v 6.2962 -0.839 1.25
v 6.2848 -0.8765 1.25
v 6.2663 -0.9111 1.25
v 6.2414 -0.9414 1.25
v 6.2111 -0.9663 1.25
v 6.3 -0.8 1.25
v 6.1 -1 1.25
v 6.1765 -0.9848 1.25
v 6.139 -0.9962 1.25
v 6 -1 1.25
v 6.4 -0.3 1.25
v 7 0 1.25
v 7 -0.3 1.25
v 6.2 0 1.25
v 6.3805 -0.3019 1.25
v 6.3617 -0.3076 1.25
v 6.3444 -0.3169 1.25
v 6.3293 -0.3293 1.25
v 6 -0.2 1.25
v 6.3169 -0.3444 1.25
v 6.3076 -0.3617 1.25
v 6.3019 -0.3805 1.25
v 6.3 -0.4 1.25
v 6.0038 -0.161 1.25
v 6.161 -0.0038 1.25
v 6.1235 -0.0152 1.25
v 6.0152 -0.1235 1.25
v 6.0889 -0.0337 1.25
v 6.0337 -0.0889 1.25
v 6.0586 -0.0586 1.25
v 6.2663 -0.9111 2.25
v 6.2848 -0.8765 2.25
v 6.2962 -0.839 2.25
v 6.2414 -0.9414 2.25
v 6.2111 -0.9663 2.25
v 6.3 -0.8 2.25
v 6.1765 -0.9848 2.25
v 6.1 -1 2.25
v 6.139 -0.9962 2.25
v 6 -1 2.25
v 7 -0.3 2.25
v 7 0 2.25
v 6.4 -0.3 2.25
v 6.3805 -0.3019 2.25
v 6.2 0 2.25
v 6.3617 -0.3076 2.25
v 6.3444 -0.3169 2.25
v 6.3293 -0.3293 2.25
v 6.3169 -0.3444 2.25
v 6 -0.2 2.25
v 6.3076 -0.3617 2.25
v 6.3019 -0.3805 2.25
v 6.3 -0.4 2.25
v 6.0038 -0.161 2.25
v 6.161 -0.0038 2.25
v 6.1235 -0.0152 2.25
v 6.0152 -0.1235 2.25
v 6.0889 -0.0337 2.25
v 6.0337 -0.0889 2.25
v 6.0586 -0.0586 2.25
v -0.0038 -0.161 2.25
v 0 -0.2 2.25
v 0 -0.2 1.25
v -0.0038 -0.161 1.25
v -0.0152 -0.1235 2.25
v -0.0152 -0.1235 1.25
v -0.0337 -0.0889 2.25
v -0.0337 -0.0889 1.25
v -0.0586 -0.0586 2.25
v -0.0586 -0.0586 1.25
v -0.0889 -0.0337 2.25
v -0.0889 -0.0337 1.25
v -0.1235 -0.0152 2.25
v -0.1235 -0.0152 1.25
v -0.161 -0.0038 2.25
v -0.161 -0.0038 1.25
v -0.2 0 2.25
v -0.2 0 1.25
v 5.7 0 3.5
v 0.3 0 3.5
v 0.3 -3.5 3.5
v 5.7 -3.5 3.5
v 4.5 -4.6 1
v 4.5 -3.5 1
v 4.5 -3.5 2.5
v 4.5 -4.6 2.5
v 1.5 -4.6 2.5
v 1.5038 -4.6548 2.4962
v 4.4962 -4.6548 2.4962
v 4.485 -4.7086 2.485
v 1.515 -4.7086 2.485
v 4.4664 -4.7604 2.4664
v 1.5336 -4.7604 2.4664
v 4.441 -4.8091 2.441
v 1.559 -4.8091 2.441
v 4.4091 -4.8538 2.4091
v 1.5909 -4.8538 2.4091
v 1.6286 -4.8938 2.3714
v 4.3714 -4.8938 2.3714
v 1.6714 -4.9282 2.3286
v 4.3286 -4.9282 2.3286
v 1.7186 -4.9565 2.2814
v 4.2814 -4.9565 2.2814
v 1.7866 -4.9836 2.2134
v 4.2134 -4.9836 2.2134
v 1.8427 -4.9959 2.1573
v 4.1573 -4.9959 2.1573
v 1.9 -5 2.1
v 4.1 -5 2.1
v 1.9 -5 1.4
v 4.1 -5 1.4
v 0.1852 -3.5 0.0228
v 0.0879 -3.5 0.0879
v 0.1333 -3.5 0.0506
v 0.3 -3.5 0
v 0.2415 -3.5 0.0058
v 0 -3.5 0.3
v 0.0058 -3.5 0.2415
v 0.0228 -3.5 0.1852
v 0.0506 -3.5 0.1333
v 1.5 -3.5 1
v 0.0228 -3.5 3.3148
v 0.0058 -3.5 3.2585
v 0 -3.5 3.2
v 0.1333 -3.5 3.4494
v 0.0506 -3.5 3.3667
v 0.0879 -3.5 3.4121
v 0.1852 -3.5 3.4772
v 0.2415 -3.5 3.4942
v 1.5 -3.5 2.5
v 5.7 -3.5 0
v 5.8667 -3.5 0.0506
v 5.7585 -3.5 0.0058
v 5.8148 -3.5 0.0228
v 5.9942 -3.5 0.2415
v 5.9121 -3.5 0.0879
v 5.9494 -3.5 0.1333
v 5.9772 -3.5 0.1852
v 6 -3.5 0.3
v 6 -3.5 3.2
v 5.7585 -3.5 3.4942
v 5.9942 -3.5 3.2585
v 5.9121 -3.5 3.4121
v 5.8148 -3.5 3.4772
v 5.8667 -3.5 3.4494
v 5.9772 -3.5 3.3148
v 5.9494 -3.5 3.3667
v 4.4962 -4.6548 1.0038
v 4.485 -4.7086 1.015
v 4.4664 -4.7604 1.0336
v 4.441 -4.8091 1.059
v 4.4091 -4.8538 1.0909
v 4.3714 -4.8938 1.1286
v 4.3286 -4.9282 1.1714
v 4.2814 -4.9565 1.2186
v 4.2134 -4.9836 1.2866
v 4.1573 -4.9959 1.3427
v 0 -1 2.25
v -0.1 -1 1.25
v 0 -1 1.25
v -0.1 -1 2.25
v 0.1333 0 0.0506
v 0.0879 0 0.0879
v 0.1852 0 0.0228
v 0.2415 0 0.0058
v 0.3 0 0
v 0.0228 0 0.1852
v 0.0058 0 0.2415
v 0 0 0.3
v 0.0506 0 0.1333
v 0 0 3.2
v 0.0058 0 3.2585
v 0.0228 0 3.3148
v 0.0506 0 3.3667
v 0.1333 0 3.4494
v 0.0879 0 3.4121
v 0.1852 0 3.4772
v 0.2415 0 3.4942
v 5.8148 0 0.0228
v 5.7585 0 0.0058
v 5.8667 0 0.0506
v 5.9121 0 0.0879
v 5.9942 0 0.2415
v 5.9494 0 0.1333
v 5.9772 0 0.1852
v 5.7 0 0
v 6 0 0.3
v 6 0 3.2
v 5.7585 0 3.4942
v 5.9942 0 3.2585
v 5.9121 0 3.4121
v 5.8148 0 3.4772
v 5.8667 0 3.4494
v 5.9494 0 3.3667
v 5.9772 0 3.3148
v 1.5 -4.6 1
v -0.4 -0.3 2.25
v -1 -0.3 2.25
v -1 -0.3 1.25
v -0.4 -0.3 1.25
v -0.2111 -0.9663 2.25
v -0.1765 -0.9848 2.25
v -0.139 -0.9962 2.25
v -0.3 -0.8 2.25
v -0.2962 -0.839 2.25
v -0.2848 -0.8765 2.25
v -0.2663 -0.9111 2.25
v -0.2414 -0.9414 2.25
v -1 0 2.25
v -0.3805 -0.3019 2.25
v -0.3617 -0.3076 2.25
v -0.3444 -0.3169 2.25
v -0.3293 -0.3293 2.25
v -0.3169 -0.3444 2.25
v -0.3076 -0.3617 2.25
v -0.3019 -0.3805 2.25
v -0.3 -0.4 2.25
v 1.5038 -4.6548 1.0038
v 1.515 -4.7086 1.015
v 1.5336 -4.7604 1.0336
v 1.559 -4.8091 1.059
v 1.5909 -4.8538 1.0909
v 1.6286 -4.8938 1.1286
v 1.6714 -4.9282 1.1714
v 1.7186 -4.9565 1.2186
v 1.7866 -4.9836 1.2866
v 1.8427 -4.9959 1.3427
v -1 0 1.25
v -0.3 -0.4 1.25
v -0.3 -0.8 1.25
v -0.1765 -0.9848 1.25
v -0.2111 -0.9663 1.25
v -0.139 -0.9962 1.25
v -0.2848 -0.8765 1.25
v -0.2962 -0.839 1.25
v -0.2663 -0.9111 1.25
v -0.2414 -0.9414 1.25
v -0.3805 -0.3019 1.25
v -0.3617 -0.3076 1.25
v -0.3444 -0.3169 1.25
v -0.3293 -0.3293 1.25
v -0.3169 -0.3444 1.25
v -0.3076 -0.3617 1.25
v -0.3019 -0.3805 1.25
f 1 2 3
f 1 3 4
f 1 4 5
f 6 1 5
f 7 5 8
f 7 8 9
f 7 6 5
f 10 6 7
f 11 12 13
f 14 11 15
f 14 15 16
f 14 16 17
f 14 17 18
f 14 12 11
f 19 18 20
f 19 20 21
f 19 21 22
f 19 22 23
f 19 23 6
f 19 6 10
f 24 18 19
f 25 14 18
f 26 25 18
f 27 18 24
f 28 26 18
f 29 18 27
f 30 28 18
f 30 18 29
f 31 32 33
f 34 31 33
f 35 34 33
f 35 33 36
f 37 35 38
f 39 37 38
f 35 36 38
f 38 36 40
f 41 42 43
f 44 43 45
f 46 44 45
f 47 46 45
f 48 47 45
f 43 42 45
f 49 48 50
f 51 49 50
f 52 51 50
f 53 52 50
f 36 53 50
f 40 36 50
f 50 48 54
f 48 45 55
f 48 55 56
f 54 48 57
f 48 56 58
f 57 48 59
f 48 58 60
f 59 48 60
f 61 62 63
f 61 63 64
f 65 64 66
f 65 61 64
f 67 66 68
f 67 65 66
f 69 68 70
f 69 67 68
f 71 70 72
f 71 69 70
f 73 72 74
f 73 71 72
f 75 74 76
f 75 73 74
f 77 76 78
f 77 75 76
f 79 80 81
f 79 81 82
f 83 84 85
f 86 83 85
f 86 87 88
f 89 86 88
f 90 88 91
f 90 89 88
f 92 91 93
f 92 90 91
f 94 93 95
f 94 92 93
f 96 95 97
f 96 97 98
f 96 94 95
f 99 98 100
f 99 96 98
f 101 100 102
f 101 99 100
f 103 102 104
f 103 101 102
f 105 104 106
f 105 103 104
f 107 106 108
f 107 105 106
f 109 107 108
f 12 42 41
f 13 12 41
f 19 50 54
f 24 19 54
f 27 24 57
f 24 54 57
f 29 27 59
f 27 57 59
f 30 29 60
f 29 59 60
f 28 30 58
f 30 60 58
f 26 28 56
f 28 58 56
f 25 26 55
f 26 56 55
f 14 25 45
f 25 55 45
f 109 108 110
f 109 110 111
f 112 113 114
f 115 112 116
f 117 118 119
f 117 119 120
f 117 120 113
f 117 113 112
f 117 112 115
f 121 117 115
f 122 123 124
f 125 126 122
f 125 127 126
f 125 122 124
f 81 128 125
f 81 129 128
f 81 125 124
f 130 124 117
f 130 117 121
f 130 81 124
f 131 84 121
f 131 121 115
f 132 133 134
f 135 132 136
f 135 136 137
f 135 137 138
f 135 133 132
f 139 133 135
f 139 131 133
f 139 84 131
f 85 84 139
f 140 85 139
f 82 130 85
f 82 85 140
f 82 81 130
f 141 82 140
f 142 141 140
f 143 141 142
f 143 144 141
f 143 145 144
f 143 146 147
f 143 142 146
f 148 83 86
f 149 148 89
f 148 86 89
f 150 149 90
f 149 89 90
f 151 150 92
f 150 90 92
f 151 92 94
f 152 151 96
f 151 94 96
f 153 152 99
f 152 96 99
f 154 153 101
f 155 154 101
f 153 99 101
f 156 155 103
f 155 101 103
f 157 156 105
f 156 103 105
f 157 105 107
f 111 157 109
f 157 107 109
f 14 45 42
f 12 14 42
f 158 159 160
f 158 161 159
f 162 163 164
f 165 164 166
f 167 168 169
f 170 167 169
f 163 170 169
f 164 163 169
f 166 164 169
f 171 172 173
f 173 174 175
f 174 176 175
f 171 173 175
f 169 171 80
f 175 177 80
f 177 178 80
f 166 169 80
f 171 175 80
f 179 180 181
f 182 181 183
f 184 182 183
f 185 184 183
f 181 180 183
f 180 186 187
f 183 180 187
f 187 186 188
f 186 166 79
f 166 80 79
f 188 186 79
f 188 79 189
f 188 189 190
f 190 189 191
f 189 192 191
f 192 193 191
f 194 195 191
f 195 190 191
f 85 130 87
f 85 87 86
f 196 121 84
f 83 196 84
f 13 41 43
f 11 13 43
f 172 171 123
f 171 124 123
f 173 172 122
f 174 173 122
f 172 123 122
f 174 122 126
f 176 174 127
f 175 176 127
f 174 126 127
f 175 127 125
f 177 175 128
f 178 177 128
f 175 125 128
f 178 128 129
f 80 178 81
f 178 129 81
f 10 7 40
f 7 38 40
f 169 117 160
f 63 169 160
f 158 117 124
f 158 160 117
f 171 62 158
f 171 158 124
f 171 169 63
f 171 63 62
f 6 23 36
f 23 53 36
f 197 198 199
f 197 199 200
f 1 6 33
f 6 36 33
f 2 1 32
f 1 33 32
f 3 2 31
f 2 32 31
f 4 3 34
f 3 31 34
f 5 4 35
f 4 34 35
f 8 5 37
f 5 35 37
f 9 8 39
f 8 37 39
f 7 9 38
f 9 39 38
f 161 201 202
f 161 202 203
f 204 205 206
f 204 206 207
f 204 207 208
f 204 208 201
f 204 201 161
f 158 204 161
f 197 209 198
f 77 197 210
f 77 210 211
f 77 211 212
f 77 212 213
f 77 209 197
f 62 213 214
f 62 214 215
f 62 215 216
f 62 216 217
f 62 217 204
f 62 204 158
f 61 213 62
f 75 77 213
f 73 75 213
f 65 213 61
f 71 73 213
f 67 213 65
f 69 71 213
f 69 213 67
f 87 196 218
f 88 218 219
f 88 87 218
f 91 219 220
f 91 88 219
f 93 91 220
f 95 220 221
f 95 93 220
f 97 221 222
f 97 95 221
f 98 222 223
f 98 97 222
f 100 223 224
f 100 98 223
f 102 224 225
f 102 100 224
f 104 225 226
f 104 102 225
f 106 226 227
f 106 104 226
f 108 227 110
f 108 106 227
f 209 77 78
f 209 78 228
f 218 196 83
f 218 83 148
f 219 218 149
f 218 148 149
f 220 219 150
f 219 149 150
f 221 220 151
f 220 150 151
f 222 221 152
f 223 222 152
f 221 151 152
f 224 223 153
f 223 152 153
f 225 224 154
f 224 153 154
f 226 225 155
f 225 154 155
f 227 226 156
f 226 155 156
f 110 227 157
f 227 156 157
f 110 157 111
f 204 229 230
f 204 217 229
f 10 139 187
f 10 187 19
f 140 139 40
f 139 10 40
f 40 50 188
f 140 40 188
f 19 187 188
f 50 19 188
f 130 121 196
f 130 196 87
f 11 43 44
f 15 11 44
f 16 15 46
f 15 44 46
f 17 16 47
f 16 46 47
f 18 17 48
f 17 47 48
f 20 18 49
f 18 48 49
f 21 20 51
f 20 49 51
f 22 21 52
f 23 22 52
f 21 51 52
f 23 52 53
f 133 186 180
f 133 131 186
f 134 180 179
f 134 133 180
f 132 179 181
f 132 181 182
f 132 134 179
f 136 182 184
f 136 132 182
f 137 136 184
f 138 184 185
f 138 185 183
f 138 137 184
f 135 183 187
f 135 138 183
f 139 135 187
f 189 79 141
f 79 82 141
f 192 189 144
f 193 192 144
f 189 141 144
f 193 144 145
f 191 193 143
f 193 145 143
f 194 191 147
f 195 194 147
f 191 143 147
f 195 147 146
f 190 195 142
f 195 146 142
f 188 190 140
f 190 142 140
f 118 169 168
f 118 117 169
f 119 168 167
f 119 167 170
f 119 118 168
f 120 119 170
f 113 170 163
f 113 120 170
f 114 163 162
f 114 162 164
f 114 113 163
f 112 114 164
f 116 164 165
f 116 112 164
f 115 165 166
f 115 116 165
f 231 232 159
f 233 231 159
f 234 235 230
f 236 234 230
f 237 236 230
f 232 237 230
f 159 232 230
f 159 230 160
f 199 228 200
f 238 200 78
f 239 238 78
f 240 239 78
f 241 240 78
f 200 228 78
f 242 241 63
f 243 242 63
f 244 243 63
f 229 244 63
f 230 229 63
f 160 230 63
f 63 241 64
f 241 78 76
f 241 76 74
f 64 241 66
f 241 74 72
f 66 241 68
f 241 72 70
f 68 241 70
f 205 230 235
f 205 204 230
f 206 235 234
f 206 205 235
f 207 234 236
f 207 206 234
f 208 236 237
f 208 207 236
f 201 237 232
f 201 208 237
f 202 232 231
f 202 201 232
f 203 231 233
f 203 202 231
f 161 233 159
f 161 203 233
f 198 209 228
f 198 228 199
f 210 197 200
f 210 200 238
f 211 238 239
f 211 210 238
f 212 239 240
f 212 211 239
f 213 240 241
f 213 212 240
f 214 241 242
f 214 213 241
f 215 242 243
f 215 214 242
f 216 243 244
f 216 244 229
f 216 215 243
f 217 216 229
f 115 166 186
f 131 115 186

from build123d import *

# Parameters (mm, degrees)
F0_W     = 6
F0_H     = 3.5
F1_DEPTH = 3.5
F2_W     = 3
F2_H     = 1.5
F3_DEPTH = 1.5
F4_R     = 0.3
F5_R     = 0.4
F8_DEPTH = 0.5


# Not quite as in the source:
# - a pattern or mirror of a feature is missing from the dataset's text; its kind, count and spacing are read off the source's solid


with BuildPart() as f1:
    # F0 (on Front) → F1 (new body)
    with BuildSketch(Plane.XZ):
        with Locations((3, 1.75)):
            Rectangle(F0_W, F0_H)
    extrude(amount=F1_DEPTH)

    # F2 (on face) → F3 (join)
    with BuildSketch(Plane.XZ.offset(3.5)):
        with Locations((3, 1.75)):
            Rectangle(F2_W, F2_H)
    extrude(amount=F3_DEPTH)

    # F4
    f4_edges = [f1.edges().sort_by_distance(p)[0] for p in [
        (0, -1.75, 0),
        (0, -1.75, 3.5),
        (6, -1.75, 0),
        (6, -1.75, 3.5),
    ]]
    fillet(f4_edges, radius=F4_R)

    # F5
    f5_edges = [f1.edges().sort_by_distance(p)[0] for p in [
        (1.5, -5, 1.75),
        (3, -5, 2.5),
        (3, -5, 1),
        (4.5, -5, 1.75),
    ]]
    fillet(f5_edges, radius=F5_R)

    # F7 (on mid) → F8 (join, symmetric)
    with BuildSketch(Plane.XY.offset(1.75)):
        with BuildLine():
            Line((-0.1, -1), (0, -1))
            Line((0, -1), (0, -0.2))
            ThreePointArc((0, -0.2), (-0.0585786438, -0.0585786438), (-0.2, 0))
            Line((-0.2, 0), (-1, 0))
            Line((-1, 0), (-1, -0.3))
            Line((-1, -0.3), (-0.4, -0.3))
            ThreePointArc((-0.4, -0.3), (-0.3292893219, -0.3292893219), (-0.3, -0.4))
            Line((-0.3, -0.4), (-0.3, -0.8))
            ThreePointArc((-0.3, -0.8), (-0.2414213562, -0.9414213562), (-0.1, -1))
        make_face()
    f8 = extrude(amount=F8_DEPTH, both=True)

    # F8_copies: F8 across plane
    add(f8.mirror(Plane(origin=(3, 0, 0), x_dir=(0, 0, 1), z_dir=(1, 0, 0))))


solid = f1.part
